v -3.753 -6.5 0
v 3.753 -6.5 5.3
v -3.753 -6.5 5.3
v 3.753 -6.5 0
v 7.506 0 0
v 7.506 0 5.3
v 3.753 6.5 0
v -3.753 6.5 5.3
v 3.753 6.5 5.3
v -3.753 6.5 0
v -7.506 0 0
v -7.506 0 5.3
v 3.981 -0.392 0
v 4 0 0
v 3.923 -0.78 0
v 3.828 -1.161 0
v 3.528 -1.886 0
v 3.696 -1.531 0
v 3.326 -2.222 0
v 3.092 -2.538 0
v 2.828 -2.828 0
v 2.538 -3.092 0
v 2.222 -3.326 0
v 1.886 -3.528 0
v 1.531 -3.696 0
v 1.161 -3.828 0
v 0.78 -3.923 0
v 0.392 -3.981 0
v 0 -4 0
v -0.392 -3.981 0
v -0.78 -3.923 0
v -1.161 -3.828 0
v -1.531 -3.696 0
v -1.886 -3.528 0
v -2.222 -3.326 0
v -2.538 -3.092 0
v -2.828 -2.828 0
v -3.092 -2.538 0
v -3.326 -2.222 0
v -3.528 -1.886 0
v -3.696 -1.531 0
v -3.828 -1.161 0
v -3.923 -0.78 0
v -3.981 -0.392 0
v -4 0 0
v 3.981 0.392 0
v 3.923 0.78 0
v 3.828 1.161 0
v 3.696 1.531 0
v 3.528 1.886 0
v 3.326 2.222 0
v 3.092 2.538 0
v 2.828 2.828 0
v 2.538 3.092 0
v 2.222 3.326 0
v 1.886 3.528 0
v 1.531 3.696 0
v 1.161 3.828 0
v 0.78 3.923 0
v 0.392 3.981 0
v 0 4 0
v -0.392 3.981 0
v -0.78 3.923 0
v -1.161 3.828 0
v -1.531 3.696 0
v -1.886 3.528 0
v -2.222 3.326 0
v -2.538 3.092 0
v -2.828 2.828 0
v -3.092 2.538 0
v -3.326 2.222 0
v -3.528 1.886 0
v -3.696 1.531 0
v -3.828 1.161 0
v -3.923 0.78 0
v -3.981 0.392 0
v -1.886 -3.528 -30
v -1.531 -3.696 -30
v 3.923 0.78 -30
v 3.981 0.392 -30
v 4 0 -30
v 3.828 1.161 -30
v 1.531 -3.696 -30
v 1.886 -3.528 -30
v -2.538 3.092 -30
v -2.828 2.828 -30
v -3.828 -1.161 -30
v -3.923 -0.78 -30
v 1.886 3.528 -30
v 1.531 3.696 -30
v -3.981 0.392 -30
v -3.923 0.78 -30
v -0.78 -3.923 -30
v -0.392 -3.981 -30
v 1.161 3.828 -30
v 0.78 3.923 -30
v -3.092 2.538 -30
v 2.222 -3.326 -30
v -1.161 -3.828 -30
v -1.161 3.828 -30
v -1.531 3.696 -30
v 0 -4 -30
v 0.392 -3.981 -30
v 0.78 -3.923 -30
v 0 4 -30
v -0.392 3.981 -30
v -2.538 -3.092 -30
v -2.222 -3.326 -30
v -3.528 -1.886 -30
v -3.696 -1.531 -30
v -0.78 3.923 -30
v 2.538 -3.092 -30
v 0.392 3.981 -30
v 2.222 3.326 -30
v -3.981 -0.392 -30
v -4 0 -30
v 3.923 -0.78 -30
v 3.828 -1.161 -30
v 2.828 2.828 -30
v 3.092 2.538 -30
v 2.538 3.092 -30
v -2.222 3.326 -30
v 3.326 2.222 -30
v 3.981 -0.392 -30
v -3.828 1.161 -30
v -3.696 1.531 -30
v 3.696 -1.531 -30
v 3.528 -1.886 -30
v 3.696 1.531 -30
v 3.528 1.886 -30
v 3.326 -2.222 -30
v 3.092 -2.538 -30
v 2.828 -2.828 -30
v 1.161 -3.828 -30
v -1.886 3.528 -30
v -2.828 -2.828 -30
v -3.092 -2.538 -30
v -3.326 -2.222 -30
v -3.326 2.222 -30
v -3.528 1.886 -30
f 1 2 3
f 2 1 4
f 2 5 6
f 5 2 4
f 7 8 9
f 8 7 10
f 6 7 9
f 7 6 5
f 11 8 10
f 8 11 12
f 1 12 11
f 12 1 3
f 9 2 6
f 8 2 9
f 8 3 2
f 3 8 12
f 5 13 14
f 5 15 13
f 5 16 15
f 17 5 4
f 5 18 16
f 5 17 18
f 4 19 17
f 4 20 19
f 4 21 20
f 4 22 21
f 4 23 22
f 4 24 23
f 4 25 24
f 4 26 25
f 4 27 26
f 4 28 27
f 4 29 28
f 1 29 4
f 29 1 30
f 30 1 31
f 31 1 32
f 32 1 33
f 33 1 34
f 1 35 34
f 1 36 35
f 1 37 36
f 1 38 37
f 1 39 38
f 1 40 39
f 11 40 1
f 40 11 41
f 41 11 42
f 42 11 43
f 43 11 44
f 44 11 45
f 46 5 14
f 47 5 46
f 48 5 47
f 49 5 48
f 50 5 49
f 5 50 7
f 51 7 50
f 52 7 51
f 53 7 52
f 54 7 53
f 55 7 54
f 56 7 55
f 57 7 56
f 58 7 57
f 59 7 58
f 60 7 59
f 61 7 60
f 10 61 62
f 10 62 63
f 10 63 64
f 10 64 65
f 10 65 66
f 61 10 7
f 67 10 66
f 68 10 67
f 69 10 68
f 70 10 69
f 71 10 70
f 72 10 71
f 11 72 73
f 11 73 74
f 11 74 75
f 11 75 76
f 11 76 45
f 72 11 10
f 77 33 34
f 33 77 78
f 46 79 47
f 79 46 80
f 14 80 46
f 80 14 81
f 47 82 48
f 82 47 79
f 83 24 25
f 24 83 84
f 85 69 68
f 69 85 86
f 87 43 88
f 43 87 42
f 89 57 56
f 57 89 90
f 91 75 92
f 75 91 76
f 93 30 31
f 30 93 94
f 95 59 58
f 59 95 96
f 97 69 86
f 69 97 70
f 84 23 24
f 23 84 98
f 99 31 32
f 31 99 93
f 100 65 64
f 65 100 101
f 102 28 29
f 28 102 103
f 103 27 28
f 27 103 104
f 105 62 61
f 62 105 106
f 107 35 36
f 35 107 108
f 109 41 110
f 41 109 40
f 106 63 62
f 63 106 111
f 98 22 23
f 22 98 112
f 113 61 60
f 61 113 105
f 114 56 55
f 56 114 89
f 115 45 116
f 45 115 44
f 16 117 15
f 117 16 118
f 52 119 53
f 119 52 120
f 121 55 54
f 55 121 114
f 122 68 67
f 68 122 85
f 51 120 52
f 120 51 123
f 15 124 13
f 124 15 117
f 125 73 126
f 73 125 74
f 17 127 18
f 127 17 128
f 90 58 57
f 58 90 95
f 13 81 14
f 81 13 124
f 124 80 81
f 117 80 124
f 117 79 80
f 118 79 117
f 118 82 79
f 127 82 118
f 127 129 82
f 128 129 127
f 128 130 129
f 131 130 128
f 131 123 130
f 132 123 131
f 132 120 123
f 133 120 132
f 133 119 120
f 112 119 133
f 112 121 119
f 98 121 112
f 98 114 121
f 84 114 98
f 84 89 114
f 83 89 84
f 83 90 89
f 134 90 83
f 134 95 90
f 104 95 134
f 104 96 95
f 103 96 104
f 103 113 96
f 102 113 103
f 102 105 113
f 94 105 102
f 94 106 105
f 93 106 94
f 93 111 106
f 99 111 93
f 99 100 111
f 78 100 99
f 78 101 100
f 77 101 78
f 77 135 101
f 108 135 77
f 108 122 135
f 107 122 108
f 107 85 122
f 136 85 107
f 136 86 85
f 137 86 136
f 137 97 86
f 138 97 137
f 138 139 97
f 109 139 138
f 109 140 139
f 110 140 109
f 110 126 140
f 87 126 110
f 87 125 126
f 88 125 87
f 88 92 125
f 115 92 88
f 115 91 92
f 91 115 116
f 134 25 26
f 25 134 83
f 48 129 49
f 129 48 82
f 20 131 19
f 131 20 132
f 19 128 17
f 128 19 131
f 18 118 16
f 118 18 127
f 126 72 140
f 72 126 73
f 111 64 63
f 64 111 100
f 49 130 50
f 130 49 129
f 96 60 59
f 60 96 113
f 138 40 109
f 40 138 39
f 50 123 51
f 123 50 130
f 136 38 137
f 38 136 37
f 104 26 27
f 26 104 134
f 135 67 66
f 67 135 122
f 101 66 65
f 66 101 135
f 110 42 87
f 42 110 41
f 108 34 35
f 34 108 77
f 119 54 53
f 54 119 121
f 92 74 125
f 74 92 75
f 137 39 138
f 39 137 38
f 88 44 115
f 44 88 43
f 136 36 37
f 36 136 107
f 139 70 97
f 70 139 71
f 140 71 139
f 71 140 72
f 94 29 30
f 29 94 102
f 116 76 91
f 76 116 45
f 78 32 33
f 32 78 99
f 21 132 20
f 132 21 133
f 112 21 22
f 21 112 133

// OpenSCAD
// --- Dimensions ---
// Head
head_across_flats = 13; // 対辺距離
head_height = 5.3;      // 高さ

// Shank
shank_diameter = 8;     // 直径
shank_length = 30;      // 長さ

// --- Model ---
union() {
    // 六角形の頭部を作成
    // cylinderの直径は外接円の直径で指定するため、対辺距離から計算
    // 頭部の底面がz=0になるように配置
    cylinder(
        h = head_height,
        d = head_across_flats / cos(30),
        $fn = 6
    );

    // 円柱のシャンクを作成
    // 頭部の底面(z=0)から-z方向へ伸ばすため、translateで移動
    translate([0, 0, -shank_length]) {
        cylinder(
            h = shank_length,
            d = shank_diameter,
            $fn = 64 // 円を滑らかにするための解像度
        );
    }
}
